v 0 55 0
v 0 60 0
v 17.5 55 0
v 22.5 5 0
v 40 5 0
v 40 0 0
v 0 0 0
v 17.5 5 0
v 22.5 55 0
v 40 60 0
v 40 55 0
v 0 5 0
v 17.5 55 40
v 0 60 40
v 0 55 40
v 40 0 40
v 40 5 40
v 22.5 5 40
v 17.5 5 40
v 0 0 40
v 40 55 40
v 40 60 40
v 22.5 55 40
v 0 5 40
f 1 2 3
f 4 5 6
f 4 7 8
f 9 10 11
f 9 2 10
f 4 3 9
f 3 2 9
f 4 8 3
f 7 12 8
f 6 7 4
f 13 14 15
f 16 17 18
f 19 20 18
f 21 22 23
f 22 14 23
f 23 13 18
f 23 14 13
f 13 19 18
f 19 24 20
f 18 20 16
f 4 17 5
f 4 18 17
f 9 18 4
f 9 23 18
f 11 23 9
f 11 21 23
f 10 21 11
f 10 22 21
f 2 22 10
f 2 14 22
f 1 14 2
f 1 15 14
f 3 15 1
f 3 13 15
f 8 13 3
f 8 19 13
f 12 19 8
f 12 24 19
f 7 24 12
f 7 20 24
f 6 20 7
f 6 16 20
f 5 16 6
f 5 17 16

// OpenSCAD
$fn = 32;

// ----------------------------------------------------------------------
// Structural section: ibeam 40 x 60 mm
// ----------------------------------------------------------------------

// --- parameters (mm) ---
sec_w = 40;               // section width, X
sec_h = 60;               // section height, Y
flange_t = 5;             // flange thickness
web_t = 5;                // web thickness
plate_t = 40;             // cut length, Z (extrusion height)
fit_tol = 0.05;           // declared fit tolerance (prompt contract)
free_tol = 0.3;           // declared free tolerance (prompt contract)

profile = [[0, 0], [40, 0], [40, 5], [22.5, 5], [22.5, 55], [40, 55], [40, 60], [0, 60], [0, 55], [17.5, 55], [17.5, 5], [0, 5]];  // primary outline, 12 points, counter clockwise

// --- the one profile operation ---
linear_extrude(height = plate_t) polygon(points = profile);
